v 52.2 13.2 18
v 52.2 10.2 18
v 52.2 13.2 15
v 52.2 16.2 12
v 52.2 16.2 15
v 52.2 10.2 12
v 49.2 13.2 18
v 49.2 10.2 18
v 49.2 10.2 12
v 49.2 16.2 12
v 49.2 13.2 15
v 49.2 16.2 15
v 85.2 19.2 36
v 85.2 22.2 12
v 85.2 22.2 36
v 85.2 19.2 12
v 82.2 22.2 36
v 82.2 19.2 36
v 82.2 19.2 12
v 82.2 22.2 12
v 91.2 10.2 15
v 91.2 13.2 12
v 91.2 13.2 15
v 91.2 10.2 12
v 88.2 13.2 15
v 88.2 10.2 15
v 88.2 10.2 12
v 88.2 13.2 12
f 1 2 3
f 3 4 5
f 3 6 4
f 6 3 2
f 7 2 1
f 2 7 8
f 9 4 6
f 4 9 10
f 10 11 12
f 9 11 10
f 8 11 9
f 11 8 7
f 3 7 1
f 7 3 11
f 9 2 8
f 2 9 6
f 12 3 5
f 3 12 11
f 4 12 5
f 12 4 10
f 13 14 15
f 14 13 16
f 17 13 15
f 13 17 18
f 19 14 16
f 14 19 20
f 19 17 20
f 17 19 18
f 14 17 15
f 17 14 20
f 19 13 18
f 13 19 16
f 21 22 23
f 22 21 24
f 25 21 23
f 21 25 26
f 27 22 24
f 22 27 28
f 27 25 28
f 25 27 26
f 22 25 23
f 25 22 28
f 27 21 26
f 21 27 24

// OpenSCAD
union() {
	translate(v = [49.2, 10.200000000000001, 12.0]) {
		cube(size = [3.0, 3.0, 6.0]);
	}
	translate(v = [49.2, 13.200000000000001, 12.0]) {
		cube(size = [3.0, 3.0, 3.0]);
	}
	translate(v = [82.2, 19.200000000000003, 12.0]) {
		cube(size = [3.0, 3.0, 24.0]);
	}
	translate(v = [88.2, 10.200000000000001, 12.0]) {
		cube(size = [3.0, 3.0, 3.0]);
	}
}
